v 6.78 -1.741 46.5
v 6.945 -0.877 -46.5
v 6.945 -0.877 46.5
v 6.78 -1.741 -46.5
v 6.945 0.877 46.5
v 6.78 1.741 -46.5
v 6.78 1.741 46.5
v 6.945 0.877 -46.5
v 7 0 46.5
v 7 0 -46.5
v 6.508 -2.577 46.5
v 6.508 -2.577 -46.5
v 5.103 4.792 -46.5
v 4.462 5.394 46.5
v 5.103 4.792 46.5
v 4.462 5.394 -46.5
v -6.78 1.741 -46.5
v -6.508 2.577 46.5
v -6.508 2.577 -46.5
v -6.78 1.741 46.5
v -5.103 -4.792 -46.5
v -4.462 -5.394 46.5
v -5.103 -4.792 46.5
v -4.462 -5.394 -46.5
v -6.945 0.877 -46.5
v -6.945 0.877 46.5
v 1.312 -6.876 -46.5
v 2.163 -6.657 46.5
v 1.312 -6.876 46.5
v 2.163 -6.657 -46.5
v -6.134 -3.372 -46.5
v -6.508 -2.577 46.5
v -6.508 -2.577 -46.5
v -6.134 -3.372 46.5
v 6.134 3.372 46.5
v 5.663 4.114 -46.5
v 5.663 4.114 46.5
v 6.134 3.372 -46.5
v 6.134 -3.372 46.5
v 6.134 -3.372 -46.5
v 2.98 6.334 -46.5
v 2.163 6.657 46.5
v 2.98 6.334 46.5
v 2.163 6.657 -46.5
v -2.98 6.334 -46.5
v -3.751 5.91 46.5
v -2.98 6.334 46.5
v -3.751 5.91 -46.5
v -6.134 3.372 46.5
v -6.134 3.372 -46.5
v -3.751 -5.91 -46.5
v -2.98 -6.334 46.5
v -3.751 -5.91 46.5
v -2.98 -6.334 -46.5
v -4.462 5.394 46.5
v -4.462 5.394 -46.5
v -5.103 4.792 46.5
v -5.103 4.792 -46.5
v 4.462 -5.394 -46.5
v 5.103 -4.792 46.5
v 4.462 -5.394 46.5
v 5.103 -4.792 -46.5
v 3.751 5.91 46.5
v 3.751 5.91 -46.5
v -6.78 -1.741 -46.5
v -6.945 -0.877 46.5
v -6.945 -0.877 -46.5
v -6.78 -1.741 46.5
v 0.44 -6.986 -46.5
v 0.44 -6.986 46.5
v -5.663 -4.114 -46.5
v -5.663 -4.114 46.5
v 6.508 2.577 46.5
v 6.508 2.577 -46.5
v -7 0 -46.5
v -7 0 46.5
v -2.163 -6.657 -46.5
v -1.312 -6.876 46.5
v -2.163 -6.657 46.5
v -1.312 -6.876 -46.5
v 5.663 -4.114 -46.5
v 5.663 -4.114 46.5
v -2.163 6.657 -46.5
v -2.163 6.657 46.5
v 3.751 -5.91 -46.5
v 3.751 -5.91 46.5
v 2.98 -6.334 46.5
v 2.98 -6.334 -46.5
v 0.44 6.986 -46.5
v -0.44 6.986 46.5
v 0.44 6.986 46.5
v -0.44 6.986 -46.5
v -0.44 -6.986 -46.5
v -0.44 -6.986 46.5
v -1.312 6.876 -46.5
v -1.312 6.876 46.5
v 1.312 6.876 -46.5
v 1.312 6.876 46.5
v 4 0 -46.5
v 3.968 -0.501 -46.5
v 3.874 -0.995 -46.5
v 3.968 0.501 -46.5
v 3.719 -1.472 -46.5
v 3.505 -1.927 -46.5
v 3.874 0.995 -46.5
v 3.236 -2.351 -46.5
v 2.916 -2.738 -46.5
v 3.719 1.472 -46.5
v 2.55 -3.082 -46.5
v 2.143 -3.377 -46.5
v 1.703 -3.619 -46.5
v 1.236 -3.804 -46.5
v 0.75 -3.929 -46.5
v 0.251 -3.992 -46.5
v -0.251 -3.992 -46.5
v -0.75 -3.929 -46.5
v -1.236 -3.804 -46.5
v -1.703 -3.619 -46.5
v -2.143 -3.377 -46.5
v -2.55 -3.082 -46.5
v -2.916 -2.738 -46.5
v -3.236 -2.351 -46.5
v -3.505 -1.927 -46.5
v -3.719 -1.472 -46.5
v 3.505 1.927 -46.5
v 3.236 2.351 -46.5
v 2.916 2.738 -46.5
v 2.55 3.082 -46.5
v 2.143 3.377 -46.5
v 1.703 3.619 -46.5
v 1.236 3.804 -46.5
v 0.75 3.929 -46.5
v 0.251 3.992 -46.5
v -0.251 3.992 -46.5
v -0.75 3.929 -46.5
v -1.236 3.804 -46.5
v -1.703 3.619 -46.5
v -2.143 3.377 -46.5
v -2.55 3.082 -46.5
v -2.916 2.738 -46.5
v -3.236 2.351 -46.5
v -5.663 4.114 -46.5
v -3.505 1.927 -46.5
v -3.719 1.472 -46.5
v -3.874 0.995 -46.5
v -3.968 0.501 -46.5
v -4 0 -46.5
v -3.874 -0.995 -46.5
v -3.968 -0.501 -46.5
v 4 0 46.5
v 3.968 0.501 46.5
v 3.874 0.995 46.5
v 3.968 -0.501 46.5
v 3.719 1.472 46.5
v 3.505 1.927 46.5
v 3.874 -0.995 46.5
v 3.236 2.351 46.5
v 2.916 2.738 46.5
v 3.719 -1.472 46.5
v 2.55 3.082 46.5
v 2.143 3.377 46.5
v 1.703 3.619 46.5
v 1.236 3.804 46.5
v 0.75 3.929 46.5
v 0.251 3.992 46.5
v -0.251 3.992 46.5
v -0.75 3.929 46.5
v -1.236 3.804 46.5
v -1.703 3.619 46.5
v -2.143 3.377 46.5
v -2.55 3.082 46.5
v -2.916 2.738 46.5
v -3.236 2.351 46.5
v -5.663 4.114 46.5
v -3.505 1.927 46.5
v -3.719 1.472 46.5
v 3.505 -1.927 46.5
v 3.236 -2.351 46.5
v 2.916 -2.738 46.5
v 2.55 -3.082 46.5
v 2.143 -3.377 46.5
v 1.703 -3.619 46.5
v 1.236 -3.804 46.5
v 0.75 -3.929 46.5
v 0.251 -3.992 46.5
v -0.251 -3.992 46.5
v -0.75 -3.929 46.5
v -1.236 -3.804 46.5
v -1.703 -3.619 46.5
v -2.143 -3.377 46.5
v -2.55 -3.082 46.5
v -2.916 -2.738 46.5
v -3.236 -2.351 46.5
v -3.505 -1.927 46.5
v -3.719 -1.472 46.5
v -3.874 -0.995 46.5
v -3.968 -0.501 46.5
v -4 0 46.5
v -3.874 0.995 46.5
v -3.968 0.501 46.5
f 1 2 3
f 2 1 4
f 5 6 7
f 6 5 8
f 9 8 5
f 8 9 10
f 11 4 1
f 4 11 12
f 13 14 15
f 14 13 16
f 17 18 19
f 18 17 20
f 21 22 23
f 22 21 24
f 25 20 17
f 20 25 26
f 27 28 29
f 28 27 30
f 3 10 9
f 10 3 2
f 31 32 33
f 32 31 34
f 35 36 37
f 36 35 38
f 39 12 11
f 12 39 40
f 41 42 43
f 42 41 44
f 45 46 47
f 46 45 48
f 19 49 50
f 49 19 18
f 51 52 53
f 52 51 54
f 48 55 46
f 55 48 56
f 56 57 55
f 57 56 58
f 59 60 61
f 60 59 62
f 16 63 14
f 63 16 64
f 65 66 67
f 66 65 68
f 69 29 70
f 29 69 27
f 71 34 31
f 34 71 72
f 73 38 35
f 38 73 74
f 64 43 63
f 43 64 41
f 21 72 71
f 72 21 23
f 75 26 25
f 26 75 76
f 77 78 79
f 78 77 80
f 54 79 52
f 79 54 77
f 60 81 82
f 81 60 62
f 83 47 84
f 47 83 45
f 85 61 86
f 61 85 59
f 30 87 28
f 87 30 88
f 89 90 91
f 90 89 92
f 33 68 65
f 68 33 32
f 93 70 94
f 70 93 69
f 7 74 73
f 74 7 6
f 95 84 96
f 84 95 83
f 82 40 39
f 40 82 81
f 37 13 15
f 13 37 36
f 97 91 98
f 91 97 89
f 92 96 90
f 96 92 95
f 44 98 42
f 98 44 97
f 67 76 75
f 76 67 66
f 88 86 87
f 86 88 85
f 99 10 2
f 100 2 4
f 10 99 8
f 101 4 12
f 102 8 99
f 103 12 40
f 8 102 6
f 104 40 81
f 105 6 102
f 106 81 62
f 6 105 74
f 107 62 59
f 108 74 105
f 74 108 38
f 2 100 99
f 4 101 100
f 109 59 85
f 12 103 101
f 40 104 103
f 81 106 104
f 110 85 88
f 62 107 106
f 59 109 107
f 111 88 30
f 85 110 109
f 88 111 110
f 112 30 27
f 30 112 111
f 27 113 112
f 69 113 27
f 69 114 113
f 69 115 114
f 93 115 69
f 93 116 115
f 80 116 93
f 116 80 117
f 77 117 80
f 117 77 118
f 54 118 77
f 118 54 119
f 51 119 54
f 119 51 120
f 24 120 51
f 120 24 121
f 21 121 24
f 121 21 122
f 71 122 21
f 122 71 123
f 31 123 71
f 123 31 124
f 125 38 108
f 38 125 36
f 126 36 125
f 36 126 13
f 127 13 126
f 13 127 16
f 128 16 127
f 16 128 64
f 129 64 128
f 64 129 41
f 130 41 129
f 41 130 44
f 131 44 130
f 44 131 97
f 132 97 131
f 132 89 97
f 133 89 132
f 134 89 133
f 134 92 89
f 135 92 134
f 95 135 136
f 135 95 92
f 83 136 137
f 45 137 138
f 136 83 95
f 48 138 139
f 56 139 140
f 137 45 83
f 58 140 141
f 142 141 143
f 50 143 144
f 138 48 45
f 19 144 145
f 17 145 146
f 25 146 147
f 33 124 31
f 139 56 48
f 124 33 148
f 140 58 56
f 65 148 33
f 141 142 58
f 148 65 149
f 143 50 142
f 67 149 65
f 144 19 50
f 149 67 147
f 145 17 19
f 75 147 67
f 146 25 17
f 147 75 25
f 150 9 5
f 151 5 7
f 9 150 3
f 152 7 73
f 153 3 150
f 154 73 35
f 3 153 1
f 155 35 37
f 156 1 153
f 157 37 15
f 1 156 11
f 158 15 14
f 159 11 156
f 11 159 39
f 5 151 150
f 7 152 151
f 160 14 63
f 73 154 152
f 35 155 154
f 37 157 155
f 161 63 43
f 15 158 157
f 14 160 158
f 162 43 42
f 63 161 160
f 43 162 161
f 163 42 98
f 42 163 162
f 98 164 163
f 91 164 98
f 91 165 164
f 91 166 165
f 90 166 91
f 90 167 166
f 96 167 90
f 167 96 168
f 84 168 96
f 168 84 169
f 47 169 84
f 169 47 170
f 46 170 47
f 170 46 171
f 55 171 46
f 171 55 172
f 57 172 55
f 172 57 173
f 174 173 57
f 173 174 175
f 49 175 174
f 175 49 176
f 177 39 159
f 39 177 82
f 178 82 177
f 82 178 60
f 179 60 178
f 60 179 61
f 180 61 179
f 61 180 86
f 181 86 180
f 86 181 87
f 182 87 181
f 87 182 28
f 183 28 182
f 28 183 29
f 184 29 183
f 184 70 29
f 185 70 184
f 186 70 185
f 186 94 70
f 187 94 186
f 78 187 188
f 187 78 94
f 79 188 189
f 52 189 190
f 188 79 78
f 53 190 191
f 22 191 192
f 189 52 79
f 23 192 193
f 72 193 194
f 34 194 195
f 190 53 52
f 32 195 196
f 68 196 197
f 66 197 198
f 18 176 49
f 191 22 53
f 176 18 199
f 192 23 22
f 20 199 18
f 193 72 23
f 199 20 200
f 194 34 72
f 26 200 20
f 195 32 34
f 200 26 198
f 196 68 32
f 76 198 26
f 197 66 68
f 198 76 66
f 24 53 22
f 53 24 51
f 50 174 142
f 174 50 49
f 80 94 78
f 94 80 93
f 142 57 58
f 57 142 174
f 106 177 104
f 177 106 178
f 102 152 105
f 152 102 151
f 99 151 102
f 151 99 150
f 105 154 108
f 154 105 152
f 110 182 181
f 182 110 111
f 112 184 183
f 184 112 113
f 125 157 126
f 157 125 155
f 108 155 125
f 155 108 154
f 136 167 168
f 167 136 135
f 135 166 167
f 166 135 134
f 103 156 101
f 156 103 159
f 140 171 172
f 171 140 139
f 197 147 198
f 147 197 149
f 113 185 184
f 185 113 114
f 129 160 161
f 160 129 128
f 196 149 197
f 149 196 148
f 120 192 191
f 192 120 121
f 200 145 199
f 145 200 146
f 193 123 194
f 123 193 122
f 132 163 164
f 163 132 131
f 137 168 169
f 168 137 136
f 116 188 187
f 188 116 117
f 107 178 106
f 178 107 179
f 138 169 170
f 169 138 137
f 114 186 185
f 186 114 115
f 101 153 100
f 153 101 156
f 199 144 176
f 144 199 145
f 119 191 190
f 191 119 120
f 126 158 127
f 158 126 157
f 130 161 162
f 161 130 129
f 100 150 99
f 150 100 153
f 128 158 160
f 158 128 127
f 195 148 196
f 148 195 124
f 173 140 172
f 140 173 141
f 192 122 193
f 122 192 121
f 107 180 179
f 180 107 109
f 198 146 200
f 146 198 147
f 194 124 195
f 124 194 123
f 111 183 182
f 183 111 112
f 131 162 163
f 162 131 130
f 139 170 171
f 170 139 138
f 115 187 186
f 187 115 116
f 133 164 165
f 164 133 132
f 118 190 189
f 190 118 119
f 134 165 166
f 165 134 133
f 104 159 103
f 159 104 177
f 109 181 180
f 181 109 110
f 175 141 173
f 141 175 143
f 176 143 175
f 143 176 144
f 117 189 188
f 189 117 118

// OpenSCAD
$fn = 50;


difference() {
	union() {
		translate(v = [0, 0, -46.5000000000]) {
			cylinder(h = 93, r = 7.0000000000);
		}
	}
	union() {
		translate(v = [0, 0, -100.0000000000]) {
			cylinder(h = 200, r = 4.0000000000);
		}
	}
}
